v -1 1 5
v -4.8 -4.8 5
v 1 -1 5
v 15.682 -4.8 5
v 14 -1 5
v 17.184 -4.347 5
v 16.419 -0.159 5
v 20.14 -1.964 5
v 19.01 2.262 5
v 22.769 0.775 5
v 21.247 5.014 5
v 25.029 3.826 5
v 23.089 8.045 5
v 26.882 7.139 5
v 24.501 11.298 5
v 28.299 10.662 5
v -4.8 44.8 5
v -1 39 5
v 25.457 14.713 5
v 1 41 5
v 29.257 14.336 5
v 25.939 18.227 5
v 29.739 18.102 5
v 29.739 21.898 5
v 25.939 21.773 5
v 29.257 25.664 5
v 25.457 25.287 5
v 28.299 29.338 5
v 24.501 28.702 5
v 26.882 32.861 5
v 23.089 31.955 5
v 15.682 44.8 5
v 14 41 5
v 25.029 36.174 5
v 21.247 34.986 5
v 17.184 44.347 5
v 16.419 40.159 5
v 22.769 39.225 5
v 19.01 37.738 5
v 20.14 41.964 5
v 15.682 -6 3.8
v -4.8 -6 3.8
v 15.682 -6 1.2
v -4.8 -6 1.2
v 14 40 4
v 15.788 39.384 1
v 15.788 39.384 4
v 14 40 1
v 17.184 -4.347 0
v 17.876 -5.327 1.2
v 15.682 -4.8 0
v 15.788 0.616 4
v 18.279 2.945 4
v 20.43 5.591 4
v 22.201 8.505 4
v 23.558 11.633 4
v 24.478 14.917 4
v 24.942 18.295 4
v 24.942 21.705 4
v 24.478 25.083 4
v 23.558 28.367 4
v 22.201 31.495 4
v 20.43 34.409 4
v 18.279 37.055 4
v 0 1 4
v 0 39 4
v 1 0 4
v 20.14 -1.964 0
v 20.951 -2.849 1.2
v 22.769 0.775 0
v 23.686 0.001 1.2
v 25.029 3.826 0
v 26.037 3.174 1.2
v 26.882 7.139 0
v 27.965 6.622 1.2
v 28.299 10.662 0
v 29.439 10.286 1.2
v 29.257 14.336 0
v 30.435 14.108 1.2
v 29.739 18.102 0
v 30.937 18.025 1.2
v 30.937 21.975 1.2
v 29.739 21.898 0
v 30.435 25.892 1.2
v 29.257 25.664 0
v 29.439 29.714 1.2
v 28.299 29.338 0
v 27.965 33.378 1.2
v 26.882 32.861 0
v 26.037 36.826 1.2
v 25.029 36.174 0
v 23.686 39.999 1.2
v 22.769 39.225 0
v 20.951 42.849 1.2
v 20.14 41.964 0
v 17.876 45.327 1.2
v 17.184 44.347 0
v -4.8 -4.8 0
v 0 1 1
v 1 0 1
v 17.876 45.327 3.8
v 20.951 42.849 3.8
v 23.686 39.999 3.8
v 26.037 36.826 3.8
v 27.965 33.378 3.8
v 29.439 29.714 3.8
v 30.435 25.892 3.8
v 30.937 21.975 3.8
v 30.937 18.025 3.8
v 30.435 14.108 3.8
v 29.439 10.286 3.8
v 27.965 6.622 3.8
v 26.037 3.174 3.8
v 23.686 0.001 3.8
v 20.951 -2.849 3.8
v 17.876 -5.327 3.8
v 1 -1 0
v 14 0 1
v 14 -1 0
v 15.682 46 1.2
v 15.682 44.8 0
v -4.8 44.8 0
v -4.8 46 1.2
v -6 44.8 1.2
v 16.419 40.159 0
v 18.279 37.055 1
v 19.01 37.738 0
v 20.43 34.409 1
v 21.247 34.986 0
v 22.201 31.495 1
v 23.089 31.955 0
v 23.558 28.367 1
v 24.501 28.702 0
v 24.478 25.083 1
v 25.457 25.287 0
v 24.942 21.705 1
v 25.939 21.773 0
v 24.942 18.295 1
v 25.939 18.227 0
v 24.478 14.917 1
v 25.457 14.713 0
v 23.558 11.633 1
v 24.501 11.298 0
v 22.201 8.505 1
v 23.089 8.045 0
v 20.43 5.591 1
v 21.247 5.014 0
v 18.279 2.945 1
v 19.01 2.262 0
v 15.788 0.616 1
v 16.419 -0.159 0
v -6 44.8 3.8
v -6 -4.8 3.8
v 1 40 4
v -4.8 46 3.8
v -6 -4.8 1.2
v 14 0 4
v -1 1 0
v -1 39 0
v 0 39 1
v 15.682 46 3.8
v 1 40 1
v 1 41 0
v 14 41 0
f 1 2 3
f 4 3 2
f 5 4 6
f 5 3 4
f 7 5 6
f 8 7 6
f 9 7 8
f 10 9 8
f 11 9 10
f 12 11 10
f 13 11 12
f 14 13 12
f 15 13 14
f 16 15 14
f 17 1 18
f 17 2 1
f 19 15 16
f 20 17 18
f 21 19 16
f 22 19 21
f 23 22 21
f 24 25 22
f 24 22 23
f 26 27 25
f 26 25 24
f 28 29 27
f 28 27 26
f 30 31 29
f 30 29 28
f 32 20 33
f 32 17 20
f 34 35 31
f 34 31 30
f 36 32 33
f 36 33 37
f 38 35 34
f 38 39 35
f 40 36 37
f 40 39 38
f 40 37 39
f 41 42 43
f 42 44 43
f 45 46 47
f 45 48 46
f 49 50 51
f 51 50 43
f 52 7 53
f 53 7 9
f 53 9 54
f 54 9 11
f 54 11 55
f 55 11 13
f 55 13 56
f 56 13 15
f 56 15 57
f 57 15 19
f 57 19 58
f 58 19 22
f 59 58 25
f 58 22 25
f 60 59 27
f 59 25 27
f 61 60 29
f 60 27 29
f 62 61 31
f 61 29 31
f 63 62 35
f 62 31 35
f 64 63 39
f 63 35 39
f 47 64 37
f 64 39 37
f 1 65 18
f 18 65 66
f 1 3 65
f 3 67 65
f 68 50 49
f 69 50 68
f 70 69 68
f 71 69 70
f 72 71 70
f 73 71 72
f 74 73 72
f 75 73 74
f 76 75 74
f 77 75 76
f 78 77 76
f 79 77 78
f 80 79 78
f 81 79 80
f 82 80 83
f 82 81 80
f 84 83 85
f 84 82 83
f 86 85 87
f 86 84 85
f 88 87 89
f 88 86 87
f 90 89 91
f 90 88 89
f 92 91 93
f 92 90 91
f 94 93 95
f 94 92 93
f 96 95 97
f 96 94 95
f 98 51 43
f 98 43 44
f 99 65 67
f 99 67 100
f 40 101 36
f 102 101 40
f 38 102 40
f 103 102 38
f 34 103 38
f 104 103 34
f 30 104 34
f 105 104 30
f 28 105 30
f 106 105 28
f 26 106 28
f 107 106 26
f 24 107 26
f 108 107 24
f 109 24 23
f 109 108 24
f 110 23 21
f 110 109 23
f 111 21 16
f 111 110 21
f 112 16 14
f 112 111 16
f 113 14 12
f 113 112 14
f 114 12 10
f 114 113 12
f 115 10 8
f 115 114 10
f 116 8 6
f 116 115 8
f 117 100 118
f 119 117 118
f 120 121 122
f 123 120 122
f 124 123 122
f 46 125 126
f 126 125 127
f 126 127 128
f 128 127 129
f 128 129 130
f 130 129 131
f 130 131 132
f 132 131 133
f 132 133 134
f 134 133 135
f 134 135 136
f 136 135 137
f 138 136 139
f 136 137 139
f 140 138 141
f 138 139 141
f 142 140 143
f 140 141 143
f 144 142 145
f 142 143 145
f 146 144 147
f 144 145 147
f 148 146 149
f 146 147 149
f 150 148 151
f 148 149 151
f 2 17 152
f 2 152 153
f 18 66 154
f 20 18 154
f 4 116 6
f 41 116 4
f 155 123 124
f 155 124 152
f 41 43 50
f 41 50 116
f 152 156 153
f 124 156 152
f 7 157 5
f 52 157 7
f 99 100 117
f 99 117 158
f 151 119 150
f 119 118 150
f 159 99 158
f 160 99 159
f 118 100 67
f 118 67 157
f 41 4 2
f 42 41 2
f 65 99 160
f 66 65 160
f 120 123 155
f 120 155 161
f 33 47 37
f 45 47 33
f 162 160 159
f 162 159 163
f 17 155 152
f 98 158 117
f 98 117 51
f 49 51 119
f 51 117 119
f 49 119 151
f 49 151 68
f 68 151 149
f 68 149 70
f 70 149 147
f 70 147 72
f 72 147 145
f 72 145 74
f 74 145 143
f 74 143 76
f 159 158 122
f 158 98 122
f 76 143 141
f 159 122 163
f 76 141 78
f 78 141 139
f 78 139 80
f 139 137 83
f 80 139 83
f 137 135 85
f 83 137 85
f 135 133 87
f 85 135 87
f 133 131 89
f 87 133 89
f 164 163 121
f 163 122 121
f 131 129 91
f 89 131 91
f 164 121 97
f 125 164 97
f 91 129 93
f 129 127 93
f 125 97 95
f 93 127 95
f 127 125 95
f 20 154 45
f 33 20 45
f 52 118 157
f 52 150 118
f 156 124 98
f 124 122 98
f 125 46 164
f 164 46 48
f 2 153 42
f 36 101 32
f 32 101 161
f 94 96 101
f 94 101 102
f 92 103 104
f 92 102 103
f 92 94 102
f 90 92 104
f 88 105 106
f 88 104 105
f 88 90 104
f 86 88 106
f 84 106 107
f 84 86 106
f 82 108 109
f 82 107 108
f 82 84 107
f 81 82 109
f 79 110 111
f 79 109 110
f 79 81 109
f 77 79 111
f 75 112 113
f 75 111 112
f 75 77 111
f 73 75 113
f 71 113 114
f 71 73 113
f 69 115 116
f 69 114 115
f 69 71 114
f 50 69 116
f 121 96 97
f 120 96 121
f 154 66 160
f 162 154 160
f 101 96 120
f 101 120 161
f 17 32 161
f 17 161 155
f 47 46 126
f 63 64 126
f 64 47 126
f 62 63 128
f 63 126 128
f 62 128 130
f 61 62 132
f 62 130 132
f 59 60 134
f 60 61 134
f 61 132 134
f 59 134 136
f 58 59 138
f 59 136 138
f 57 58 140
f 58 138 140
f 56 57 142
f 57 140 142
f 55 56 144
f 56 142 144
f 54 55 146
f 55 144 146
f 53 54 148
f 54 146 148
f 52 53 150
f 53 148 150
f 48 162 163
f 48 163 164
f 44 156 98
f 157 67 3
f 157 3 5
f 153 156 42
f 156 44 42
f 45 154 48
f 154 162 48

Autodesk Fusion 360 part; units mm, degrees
sketch "Sketch1" plane through (0, 0, 0) normal (0, 0, 1) x (1, 0, 0)
  line L0 (0, 0) -> (0, 40)
  line L1 (0, 40) -> (15, 40)
  line L2 (0, 0) -> (15, 0)
  arc A0 (15, 0) -> (15, 40) centre (0, 20) ccw
  line L3 (-6, -6) -> (16.8819, -6)
  arc A1 (16.8819, -6) -> (16.8819, 46) centre (0, 20) ccw
  line L4 (-6, 46) -> (16.8819, 46)
  line L5 (-6, -6) -> (-6, 46)
  dimension "d3" = 40
  dimension "d4" = 25
  dimension "d5" = 15
  dimension "d6" = -6
extrude "Extrude1" add sketch "Sketch1" along normal blind 5
chamfer "Chamfer1" distance 1.2 angle 45 4 faces at (18.0943, 45.1713, 3.3333) (1.6273, 46, 1.6667) (-6, 11.3333, 1.6667) (1.6273, -6, 1.6667)
chamfer "Chamfer2" distance 1 angle 45 4 faces at (5, 0, 1.6667) (0, 13.3333, 3.3333) (23.8152, 27.605, 3.3333) (5, 40, 1.6667)
